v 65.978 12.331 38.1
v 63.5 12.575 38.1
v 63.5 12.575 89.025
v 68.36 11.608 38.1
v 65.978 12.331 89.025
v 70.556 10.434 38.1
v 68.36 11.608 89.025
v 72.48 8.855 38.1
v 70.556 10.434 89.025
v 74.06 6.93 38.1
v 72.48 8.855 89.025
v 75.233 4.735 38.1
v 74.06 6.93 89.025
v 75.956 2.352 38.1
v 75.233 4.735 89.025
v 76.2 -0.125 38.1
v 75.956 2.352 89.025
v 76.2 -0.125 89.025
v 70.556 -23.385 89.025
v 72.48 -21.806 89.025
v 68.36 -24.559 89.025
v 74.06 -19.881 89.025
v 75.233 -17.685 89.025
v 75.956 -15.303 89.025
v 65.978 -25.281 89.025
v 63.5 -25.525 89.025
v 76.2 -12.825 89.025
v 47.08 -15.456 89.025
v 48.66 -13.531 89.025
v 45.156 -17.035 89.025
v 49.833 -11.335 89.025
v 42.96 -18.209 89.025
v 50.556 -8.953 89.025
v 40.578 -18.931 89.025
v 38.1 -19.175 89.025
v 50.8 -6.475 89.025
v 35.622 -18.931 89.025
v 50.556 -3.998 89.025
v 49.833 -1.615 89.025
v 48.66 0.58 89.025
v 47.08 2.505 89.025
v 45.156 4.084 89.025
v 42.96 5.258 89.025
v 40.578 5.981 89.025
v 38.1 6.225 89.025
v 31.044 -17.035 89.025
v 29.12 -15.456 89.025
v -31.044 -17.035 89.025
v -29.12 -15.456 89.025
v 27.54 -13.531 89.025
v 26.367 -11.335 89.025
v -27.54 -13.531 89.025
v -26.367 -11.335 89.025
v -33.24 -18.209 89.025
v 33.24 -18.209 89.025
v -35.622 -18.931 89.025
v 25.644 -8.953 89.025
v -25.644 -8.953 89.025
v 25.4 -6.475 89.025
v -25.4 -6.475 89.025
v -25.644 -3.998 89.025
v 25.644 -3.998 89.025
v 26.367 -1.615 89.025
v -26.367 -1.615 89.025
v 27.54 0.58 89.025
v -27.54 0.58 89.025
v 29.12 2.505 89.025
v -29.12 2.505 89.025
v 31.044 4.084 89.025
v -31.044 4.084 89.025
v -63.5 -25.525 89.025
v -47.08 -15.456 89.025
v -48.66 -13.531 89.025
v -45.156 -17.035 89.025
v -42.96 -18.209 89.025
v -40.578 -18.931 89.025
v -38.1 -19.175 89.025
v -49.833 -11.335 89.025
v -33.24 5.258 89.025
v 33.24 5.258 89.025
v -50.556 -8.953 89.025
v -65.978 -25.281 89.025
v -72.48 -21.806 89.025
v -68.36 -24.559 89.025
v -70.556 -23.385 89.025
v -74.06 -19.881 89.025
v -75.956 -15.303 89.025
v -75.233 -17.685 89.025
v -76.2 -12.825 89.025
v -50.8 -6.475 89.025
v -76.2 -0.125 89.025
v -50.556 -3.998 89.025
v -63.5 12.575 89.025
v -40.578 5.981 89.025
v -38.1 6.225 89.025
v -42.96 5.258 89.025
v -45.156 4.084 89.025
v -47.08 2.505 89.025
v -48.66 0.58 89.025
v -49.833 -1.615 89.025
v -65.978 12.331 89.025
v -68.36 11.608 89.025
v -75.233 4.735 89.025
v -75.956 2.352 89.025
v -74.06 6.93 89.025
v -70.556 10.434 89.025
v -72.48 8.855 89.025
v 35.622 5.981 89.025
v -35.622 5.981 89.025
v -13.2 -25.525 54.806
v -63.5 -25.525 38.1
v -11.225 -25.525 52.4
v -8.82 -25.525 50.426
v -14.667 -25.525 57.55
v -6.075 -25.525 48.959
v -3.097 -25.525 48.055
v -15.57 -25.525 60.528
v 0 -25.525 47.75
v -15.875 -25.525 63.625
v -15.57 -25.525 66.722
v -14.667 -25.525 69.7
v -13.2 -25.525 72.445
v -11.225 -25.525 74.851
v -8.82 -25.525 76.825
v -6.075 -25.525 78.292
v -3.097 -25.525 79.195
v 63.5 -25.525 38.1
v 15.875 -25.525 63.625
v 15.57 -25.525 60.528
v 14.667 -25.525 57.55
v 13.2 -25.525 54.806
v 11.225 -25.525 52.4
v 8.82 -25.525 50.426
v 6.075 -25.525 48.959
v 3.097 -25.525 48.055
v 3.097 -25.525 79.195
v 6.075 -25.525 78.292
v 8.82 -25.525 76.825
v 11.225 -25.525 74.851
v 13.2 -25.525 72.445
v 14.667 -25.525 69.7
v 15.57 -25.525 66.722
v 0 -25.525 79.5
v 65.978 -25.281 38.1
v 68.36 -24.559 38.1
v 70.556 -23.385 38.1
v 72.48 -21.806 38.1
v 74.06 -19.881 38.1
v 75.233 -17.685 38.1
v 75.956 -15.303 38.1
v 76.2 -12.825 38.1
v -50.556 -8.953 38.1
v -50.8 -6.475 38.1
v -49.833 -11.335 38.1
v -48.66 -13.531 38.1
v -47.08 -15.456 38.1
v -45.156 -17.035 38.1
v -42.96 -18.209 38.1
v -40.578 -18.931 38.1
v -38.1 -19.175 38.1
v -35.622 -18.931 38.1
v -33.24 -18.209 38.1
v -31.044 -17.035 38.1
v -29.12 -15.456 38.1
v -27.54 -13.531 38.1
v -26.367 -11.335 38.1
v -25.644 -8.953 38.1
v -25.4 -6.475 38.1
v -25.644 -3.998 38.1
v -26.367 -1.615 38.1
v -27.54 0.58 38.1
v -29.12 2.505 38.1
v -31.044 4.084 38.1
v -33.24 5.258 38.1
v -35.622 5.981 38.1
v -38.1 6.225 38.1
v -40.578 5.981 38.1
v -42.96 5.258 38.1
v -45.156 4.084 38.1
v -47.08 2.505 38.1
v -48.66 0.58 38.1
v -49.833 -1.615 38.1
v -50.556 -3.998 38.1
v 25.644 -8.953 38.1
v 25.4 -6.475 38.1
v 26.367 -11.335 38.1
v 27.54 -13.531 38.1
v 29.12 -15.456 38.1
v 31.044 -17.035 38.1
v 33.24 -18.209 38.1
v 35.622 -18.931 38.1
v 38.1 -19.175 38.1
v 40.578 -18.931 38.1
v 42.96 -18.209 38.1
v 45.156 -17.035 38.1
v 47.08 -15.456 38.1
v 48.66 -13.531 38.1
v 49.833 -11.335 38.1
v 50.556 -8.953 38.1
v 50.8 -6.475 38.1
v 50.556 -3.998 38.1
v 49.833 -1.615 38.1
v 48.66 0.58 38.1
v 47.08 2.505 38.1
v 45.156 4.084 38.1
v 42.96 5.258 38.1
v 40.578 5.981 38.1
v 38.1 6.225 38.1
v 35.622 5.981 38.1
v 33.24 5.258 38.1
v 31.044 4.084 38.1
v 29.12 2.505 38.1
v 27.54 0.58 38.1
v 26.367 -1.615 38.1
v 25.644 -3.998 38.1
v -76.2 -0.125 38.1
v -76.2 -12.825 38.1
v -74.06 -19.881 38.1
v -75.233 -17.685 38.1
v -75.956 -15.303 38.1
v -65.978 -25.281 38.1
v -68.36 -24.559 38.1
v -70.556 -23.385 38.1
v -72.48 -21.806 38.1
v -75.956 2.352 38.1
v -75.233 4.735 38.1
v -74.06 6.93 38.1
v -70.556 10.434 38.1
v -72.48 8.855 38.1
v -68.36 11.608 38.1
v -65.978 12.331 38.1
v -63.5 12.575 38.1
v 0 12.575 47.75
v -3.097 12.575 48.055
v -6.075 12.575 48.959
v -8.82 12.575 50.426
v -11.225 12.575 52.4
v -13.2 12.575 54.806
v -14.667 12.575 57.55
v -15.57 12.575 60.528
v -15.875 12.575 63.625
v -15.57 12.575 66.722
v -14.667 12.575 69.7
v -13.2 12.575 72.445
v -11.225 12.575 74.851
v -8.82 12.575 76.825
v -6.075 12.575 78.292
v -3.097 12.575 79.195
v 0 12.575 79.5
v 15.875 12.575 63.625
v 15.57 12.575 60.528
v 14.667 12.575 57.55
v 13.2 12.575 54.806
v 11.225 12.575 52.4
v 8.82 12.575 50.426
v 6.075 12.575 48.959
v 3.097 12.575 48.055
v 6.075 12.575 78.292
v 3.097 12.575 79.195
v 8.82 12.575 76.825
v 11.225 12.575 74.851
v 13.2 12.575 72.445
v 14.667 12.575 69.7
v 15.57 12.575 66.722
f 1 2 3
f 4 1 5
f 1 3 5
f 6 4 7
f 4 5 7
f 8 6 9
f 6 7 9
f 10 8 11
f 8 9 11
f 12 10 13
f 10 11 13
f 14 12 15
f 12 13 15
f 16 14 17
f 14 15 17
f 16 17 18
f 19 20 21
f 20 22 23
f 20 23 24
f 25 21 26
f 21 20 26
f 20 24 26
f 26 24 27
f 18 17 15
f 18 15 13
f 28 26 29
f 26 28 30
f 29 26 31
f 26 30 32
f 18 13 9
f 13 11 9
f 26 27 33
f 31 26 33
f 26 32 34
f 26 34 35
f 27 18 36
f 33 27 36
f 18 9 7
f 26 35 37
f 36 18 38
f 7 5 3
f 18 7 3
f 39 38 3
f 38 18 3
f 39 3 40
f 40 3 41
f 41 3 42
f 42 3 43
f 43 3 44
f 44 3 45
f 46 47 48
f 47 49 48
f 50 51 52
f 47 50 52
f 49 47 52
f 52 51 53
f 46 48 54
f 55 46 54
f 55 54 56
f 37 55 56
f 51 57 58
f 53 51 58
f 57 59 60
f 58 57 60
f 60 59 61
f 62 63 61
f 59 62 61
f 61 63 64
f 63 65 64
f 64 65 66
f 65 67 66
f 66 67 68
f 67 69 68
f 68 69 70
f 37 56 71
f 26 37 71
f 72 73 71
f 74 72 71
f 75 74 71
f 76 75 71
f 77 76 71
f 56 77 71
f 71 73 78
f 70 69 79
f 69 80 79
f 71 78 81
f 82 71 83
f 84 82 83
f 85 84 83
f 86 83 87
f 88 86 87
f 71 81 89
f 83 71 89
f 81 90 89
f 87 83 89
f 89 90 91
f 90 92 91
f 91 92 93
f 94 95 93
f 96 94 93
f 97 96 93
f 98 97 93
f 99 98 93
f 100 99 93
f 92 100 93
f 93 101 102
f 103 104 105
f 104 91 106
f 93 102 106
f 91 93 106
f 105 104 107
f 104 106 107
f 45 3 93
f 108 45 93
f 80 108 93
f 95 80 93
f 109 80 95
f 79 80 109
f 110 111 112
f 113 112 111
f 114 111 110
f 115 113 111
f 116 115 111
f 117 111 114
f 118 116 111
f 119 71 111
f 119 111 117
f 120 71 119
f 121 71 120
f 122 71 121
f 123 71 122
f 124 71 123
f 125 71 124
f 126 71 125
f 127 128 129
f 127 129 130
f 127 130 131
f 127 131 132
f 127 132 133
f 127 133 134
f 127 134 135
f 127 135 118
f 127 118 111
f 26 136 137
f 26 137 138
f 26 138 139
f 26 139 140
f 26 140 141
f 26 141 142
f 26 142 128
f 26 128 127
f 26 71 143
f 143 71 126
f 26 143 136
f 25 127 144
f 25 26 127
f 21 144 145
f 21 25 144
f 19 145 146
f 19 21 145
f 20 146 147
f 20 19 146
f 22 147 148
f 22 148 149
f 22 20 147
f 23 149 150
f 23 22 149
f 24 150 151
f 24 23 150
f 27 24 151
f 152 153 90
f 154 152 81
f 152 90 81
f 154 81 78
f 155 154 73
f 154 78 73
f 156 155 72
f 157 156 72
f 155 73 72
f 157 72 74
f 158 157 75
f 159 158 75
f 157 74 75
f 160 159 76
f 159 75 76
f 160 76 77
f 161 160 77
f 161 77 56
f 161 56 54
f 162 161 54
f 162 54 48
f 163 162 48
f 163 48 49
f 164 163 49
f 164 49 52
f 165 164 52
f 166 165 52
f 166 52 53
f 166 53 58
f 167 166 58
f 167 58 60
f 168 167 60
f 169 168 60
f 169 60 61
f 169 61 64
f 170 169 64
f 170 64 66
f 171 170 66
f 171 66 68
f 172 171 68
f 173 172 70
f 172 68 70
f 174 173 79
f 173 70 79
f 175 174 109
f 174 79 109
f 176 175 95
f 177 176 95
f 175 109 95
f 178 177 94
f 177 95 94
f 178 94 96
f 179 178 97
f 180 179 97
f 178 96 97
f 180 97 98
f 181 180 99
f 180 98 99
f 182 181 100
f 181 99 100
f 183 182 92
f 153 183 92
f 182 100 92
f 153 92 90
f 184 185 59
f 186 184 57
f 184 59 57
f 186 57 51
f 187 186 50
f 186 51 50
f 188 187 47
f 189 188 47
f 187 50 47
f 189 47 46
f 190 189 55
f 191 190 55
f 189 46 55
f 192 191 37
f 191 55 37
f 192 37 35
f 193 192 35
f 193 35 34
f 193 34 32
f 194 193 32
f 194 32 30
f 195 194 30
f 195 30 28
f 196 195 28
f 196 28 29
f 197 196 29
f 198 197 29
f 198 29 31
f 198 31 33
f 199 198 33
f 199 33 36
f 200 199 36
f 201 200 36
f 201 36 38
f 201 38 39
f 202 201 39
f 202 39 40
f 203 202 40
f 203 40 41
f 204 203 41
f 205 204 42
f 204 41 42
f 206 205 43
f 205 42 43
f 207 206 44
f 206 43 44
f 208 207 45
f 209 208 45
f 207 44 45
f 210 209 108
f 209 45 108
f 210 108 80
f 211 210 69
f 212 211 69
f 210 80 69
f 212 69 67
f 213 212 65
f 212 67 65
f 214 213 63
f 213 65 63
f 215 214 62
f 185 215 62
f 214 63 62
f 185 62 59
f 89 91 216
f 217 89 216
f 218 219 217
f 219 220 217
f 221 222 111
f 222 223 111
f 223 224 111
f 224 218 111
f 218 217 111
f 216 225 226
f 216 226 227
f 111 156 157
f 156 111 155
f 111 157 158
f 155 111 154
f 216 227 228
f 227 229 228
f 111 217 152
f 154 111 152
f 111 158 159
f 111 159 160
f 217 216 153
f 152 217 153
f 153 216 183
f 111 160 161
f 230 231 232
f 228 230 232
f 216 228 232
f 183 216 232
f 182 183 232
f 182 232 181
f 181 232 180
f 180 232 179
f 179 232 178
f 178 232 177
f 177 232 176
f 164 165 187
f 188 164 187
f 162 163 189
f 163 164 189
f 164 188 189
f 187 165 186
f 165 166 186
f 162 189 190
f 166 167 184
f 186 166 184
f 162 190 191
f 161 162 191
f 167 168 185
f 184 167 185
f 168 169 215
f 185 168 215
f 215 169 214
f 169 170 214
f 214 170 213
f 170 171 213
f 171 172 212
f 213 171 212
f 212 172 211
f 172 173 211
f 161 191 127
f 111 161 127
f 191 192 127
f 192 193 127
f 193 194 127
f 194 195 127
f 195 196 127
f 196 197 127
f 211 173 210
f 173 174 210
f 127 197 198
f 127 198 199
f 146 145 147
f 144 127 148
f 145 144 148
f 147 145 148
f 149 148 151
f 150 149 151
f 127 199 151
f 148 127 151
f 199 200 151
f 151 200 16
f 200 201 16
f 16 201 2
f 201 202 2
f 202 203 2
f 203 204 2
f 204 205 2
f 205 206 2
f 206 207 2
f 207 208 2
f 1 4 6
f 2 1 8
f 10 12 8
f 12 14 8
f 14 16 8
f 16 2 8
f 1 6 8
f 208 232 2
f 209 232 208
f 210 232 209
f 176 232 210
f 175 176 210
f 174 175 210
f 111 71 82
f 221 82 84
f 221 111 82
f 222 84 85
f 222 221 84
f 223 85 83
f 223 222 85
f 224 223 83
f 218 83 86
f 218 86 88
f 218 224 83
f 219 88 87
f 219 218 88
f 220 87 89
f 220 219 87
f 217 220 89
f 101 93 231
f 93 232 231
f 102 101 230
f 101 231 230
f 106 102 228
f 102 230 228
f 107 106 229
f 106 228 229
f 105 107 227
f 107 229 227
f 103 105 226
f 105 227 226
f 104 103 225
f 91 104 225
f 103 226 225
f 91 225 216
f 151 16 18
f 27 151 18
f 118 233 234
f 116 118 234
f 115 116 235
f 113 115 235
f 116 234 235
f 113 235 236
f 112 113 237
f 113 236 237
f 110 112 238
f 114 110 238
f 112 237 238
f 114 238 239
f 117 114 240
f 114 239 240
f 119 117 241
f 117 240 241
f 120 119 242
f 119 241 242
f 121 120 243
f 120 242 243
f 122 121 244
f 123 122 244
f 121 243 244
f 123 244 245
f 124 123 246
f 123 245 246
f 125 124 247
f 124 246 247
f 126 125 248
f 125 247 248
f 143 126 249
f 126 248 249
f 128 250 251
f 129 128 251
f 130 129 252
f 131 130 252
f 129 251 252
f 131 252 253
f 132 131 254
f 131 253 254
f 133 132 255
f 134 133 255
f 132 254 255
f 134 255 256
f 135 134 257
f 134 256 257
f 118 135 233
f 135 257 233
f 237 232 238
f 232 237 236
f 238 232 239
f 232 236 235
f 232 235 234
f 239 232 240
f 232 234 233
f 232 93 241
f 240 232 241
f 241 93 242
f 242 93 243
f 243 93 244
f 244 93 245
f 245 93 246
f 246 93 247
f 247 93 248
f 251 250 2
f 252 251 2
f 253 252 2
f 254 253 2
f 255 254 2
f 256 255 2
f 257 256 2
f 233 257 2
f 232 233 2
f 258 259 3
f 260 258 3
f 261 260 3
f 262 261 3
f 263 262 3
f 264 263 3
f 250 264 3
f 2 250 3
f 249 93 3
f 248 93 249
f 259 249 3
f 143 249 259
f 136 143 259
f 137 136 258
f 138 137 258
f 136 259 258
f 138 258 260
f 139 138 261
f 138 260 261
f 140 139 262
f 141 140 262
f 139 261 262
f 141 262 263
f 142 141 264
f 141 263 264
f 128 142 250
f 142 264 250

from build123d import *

# Parameters (mm, degrees)
F1_DEPTH = 38.1
F2_R     = 12.7
F3_DEPTH = 50.9263650248
F4_ANGLE = 90
F5_R     = 12.7


with BuildPart() as f1:
    # F0 (on Top) → F1 (new body)
    with BuildSketch(Plane.XY):
        with BuildLine():
            ThreePointArc((0, 15.875), (11.2253201513, 11.2253201513), (15.875, 0))
            ThreePointArc((15.875, 0), (11.2253201513, -11.2253201513), (0, -15.875))
            Line((0, -15.875), (0, -25.5253650248))
            Line((0, -25.5253650248), (76.2, -25.5253650248))
            Line((76.2, -25.5253650248), (76.2, 25.4))
            Line((76.2, 25.4), (0, 25.4))
            Line((0, 25.4), (0, 15.875))
        make_face()
        with BuildLine():
            ThreePointArc((0, -15.875), (-15.875, 0), (0, 15.875))
            Line((0, 15.875), (0, 25.4))
            Line((0, 25.4), (-76.2, 25.4))
            Line((-76.2, 25.4), (-76.2, -25.5253650248))
            Line((-76.2, -25.5253650248), (0, -25.5253650248))
            Line((0, -25.5253650248), (0, -15.875))
        make_face()
    extrude(amount=F1_DEPTH)

    # F2 (on face) → F3 (cut, through all)
    with BuildSketch(Plane(origin=(0, 25.4, 0), x_dir=(-1, 0, 0), z_dir=(0, 1, 0))):
        with Locations((-38.1, 19.05)):
            Circle(F2_R)
        with Locations((38.1, 19.05)):
            Circle(F2_R)
    extrude(amount=-F3_DEPTH, mode=Mode.SUBTRACT)


with BuildPart() as f1_1:
    # F4: moved
    add(f1.part.rotate(Axis((0, -25.5253650248, 38.1), (1, 0, 0)), F4_ANGLE))

    # F5
    f5_edges = [f1_1.edges().sort_by_distance(p)[0] for p in [
        (76.2, -25.525365, 63.562683),
        (76.2, 12.574635, 63.562683),
        (-76.2, -25.525365, 63.562683),
        (-76.2, 12.574635, 63.562683),
    ]]
    fillet(f5_edges, radius=F5_R)


with BuildPart() as f6_1:
    # F6: copy of F1
    add(f1_1.part.moved(Location((0, 0, 70.31364))))


solid = f1_1.part
